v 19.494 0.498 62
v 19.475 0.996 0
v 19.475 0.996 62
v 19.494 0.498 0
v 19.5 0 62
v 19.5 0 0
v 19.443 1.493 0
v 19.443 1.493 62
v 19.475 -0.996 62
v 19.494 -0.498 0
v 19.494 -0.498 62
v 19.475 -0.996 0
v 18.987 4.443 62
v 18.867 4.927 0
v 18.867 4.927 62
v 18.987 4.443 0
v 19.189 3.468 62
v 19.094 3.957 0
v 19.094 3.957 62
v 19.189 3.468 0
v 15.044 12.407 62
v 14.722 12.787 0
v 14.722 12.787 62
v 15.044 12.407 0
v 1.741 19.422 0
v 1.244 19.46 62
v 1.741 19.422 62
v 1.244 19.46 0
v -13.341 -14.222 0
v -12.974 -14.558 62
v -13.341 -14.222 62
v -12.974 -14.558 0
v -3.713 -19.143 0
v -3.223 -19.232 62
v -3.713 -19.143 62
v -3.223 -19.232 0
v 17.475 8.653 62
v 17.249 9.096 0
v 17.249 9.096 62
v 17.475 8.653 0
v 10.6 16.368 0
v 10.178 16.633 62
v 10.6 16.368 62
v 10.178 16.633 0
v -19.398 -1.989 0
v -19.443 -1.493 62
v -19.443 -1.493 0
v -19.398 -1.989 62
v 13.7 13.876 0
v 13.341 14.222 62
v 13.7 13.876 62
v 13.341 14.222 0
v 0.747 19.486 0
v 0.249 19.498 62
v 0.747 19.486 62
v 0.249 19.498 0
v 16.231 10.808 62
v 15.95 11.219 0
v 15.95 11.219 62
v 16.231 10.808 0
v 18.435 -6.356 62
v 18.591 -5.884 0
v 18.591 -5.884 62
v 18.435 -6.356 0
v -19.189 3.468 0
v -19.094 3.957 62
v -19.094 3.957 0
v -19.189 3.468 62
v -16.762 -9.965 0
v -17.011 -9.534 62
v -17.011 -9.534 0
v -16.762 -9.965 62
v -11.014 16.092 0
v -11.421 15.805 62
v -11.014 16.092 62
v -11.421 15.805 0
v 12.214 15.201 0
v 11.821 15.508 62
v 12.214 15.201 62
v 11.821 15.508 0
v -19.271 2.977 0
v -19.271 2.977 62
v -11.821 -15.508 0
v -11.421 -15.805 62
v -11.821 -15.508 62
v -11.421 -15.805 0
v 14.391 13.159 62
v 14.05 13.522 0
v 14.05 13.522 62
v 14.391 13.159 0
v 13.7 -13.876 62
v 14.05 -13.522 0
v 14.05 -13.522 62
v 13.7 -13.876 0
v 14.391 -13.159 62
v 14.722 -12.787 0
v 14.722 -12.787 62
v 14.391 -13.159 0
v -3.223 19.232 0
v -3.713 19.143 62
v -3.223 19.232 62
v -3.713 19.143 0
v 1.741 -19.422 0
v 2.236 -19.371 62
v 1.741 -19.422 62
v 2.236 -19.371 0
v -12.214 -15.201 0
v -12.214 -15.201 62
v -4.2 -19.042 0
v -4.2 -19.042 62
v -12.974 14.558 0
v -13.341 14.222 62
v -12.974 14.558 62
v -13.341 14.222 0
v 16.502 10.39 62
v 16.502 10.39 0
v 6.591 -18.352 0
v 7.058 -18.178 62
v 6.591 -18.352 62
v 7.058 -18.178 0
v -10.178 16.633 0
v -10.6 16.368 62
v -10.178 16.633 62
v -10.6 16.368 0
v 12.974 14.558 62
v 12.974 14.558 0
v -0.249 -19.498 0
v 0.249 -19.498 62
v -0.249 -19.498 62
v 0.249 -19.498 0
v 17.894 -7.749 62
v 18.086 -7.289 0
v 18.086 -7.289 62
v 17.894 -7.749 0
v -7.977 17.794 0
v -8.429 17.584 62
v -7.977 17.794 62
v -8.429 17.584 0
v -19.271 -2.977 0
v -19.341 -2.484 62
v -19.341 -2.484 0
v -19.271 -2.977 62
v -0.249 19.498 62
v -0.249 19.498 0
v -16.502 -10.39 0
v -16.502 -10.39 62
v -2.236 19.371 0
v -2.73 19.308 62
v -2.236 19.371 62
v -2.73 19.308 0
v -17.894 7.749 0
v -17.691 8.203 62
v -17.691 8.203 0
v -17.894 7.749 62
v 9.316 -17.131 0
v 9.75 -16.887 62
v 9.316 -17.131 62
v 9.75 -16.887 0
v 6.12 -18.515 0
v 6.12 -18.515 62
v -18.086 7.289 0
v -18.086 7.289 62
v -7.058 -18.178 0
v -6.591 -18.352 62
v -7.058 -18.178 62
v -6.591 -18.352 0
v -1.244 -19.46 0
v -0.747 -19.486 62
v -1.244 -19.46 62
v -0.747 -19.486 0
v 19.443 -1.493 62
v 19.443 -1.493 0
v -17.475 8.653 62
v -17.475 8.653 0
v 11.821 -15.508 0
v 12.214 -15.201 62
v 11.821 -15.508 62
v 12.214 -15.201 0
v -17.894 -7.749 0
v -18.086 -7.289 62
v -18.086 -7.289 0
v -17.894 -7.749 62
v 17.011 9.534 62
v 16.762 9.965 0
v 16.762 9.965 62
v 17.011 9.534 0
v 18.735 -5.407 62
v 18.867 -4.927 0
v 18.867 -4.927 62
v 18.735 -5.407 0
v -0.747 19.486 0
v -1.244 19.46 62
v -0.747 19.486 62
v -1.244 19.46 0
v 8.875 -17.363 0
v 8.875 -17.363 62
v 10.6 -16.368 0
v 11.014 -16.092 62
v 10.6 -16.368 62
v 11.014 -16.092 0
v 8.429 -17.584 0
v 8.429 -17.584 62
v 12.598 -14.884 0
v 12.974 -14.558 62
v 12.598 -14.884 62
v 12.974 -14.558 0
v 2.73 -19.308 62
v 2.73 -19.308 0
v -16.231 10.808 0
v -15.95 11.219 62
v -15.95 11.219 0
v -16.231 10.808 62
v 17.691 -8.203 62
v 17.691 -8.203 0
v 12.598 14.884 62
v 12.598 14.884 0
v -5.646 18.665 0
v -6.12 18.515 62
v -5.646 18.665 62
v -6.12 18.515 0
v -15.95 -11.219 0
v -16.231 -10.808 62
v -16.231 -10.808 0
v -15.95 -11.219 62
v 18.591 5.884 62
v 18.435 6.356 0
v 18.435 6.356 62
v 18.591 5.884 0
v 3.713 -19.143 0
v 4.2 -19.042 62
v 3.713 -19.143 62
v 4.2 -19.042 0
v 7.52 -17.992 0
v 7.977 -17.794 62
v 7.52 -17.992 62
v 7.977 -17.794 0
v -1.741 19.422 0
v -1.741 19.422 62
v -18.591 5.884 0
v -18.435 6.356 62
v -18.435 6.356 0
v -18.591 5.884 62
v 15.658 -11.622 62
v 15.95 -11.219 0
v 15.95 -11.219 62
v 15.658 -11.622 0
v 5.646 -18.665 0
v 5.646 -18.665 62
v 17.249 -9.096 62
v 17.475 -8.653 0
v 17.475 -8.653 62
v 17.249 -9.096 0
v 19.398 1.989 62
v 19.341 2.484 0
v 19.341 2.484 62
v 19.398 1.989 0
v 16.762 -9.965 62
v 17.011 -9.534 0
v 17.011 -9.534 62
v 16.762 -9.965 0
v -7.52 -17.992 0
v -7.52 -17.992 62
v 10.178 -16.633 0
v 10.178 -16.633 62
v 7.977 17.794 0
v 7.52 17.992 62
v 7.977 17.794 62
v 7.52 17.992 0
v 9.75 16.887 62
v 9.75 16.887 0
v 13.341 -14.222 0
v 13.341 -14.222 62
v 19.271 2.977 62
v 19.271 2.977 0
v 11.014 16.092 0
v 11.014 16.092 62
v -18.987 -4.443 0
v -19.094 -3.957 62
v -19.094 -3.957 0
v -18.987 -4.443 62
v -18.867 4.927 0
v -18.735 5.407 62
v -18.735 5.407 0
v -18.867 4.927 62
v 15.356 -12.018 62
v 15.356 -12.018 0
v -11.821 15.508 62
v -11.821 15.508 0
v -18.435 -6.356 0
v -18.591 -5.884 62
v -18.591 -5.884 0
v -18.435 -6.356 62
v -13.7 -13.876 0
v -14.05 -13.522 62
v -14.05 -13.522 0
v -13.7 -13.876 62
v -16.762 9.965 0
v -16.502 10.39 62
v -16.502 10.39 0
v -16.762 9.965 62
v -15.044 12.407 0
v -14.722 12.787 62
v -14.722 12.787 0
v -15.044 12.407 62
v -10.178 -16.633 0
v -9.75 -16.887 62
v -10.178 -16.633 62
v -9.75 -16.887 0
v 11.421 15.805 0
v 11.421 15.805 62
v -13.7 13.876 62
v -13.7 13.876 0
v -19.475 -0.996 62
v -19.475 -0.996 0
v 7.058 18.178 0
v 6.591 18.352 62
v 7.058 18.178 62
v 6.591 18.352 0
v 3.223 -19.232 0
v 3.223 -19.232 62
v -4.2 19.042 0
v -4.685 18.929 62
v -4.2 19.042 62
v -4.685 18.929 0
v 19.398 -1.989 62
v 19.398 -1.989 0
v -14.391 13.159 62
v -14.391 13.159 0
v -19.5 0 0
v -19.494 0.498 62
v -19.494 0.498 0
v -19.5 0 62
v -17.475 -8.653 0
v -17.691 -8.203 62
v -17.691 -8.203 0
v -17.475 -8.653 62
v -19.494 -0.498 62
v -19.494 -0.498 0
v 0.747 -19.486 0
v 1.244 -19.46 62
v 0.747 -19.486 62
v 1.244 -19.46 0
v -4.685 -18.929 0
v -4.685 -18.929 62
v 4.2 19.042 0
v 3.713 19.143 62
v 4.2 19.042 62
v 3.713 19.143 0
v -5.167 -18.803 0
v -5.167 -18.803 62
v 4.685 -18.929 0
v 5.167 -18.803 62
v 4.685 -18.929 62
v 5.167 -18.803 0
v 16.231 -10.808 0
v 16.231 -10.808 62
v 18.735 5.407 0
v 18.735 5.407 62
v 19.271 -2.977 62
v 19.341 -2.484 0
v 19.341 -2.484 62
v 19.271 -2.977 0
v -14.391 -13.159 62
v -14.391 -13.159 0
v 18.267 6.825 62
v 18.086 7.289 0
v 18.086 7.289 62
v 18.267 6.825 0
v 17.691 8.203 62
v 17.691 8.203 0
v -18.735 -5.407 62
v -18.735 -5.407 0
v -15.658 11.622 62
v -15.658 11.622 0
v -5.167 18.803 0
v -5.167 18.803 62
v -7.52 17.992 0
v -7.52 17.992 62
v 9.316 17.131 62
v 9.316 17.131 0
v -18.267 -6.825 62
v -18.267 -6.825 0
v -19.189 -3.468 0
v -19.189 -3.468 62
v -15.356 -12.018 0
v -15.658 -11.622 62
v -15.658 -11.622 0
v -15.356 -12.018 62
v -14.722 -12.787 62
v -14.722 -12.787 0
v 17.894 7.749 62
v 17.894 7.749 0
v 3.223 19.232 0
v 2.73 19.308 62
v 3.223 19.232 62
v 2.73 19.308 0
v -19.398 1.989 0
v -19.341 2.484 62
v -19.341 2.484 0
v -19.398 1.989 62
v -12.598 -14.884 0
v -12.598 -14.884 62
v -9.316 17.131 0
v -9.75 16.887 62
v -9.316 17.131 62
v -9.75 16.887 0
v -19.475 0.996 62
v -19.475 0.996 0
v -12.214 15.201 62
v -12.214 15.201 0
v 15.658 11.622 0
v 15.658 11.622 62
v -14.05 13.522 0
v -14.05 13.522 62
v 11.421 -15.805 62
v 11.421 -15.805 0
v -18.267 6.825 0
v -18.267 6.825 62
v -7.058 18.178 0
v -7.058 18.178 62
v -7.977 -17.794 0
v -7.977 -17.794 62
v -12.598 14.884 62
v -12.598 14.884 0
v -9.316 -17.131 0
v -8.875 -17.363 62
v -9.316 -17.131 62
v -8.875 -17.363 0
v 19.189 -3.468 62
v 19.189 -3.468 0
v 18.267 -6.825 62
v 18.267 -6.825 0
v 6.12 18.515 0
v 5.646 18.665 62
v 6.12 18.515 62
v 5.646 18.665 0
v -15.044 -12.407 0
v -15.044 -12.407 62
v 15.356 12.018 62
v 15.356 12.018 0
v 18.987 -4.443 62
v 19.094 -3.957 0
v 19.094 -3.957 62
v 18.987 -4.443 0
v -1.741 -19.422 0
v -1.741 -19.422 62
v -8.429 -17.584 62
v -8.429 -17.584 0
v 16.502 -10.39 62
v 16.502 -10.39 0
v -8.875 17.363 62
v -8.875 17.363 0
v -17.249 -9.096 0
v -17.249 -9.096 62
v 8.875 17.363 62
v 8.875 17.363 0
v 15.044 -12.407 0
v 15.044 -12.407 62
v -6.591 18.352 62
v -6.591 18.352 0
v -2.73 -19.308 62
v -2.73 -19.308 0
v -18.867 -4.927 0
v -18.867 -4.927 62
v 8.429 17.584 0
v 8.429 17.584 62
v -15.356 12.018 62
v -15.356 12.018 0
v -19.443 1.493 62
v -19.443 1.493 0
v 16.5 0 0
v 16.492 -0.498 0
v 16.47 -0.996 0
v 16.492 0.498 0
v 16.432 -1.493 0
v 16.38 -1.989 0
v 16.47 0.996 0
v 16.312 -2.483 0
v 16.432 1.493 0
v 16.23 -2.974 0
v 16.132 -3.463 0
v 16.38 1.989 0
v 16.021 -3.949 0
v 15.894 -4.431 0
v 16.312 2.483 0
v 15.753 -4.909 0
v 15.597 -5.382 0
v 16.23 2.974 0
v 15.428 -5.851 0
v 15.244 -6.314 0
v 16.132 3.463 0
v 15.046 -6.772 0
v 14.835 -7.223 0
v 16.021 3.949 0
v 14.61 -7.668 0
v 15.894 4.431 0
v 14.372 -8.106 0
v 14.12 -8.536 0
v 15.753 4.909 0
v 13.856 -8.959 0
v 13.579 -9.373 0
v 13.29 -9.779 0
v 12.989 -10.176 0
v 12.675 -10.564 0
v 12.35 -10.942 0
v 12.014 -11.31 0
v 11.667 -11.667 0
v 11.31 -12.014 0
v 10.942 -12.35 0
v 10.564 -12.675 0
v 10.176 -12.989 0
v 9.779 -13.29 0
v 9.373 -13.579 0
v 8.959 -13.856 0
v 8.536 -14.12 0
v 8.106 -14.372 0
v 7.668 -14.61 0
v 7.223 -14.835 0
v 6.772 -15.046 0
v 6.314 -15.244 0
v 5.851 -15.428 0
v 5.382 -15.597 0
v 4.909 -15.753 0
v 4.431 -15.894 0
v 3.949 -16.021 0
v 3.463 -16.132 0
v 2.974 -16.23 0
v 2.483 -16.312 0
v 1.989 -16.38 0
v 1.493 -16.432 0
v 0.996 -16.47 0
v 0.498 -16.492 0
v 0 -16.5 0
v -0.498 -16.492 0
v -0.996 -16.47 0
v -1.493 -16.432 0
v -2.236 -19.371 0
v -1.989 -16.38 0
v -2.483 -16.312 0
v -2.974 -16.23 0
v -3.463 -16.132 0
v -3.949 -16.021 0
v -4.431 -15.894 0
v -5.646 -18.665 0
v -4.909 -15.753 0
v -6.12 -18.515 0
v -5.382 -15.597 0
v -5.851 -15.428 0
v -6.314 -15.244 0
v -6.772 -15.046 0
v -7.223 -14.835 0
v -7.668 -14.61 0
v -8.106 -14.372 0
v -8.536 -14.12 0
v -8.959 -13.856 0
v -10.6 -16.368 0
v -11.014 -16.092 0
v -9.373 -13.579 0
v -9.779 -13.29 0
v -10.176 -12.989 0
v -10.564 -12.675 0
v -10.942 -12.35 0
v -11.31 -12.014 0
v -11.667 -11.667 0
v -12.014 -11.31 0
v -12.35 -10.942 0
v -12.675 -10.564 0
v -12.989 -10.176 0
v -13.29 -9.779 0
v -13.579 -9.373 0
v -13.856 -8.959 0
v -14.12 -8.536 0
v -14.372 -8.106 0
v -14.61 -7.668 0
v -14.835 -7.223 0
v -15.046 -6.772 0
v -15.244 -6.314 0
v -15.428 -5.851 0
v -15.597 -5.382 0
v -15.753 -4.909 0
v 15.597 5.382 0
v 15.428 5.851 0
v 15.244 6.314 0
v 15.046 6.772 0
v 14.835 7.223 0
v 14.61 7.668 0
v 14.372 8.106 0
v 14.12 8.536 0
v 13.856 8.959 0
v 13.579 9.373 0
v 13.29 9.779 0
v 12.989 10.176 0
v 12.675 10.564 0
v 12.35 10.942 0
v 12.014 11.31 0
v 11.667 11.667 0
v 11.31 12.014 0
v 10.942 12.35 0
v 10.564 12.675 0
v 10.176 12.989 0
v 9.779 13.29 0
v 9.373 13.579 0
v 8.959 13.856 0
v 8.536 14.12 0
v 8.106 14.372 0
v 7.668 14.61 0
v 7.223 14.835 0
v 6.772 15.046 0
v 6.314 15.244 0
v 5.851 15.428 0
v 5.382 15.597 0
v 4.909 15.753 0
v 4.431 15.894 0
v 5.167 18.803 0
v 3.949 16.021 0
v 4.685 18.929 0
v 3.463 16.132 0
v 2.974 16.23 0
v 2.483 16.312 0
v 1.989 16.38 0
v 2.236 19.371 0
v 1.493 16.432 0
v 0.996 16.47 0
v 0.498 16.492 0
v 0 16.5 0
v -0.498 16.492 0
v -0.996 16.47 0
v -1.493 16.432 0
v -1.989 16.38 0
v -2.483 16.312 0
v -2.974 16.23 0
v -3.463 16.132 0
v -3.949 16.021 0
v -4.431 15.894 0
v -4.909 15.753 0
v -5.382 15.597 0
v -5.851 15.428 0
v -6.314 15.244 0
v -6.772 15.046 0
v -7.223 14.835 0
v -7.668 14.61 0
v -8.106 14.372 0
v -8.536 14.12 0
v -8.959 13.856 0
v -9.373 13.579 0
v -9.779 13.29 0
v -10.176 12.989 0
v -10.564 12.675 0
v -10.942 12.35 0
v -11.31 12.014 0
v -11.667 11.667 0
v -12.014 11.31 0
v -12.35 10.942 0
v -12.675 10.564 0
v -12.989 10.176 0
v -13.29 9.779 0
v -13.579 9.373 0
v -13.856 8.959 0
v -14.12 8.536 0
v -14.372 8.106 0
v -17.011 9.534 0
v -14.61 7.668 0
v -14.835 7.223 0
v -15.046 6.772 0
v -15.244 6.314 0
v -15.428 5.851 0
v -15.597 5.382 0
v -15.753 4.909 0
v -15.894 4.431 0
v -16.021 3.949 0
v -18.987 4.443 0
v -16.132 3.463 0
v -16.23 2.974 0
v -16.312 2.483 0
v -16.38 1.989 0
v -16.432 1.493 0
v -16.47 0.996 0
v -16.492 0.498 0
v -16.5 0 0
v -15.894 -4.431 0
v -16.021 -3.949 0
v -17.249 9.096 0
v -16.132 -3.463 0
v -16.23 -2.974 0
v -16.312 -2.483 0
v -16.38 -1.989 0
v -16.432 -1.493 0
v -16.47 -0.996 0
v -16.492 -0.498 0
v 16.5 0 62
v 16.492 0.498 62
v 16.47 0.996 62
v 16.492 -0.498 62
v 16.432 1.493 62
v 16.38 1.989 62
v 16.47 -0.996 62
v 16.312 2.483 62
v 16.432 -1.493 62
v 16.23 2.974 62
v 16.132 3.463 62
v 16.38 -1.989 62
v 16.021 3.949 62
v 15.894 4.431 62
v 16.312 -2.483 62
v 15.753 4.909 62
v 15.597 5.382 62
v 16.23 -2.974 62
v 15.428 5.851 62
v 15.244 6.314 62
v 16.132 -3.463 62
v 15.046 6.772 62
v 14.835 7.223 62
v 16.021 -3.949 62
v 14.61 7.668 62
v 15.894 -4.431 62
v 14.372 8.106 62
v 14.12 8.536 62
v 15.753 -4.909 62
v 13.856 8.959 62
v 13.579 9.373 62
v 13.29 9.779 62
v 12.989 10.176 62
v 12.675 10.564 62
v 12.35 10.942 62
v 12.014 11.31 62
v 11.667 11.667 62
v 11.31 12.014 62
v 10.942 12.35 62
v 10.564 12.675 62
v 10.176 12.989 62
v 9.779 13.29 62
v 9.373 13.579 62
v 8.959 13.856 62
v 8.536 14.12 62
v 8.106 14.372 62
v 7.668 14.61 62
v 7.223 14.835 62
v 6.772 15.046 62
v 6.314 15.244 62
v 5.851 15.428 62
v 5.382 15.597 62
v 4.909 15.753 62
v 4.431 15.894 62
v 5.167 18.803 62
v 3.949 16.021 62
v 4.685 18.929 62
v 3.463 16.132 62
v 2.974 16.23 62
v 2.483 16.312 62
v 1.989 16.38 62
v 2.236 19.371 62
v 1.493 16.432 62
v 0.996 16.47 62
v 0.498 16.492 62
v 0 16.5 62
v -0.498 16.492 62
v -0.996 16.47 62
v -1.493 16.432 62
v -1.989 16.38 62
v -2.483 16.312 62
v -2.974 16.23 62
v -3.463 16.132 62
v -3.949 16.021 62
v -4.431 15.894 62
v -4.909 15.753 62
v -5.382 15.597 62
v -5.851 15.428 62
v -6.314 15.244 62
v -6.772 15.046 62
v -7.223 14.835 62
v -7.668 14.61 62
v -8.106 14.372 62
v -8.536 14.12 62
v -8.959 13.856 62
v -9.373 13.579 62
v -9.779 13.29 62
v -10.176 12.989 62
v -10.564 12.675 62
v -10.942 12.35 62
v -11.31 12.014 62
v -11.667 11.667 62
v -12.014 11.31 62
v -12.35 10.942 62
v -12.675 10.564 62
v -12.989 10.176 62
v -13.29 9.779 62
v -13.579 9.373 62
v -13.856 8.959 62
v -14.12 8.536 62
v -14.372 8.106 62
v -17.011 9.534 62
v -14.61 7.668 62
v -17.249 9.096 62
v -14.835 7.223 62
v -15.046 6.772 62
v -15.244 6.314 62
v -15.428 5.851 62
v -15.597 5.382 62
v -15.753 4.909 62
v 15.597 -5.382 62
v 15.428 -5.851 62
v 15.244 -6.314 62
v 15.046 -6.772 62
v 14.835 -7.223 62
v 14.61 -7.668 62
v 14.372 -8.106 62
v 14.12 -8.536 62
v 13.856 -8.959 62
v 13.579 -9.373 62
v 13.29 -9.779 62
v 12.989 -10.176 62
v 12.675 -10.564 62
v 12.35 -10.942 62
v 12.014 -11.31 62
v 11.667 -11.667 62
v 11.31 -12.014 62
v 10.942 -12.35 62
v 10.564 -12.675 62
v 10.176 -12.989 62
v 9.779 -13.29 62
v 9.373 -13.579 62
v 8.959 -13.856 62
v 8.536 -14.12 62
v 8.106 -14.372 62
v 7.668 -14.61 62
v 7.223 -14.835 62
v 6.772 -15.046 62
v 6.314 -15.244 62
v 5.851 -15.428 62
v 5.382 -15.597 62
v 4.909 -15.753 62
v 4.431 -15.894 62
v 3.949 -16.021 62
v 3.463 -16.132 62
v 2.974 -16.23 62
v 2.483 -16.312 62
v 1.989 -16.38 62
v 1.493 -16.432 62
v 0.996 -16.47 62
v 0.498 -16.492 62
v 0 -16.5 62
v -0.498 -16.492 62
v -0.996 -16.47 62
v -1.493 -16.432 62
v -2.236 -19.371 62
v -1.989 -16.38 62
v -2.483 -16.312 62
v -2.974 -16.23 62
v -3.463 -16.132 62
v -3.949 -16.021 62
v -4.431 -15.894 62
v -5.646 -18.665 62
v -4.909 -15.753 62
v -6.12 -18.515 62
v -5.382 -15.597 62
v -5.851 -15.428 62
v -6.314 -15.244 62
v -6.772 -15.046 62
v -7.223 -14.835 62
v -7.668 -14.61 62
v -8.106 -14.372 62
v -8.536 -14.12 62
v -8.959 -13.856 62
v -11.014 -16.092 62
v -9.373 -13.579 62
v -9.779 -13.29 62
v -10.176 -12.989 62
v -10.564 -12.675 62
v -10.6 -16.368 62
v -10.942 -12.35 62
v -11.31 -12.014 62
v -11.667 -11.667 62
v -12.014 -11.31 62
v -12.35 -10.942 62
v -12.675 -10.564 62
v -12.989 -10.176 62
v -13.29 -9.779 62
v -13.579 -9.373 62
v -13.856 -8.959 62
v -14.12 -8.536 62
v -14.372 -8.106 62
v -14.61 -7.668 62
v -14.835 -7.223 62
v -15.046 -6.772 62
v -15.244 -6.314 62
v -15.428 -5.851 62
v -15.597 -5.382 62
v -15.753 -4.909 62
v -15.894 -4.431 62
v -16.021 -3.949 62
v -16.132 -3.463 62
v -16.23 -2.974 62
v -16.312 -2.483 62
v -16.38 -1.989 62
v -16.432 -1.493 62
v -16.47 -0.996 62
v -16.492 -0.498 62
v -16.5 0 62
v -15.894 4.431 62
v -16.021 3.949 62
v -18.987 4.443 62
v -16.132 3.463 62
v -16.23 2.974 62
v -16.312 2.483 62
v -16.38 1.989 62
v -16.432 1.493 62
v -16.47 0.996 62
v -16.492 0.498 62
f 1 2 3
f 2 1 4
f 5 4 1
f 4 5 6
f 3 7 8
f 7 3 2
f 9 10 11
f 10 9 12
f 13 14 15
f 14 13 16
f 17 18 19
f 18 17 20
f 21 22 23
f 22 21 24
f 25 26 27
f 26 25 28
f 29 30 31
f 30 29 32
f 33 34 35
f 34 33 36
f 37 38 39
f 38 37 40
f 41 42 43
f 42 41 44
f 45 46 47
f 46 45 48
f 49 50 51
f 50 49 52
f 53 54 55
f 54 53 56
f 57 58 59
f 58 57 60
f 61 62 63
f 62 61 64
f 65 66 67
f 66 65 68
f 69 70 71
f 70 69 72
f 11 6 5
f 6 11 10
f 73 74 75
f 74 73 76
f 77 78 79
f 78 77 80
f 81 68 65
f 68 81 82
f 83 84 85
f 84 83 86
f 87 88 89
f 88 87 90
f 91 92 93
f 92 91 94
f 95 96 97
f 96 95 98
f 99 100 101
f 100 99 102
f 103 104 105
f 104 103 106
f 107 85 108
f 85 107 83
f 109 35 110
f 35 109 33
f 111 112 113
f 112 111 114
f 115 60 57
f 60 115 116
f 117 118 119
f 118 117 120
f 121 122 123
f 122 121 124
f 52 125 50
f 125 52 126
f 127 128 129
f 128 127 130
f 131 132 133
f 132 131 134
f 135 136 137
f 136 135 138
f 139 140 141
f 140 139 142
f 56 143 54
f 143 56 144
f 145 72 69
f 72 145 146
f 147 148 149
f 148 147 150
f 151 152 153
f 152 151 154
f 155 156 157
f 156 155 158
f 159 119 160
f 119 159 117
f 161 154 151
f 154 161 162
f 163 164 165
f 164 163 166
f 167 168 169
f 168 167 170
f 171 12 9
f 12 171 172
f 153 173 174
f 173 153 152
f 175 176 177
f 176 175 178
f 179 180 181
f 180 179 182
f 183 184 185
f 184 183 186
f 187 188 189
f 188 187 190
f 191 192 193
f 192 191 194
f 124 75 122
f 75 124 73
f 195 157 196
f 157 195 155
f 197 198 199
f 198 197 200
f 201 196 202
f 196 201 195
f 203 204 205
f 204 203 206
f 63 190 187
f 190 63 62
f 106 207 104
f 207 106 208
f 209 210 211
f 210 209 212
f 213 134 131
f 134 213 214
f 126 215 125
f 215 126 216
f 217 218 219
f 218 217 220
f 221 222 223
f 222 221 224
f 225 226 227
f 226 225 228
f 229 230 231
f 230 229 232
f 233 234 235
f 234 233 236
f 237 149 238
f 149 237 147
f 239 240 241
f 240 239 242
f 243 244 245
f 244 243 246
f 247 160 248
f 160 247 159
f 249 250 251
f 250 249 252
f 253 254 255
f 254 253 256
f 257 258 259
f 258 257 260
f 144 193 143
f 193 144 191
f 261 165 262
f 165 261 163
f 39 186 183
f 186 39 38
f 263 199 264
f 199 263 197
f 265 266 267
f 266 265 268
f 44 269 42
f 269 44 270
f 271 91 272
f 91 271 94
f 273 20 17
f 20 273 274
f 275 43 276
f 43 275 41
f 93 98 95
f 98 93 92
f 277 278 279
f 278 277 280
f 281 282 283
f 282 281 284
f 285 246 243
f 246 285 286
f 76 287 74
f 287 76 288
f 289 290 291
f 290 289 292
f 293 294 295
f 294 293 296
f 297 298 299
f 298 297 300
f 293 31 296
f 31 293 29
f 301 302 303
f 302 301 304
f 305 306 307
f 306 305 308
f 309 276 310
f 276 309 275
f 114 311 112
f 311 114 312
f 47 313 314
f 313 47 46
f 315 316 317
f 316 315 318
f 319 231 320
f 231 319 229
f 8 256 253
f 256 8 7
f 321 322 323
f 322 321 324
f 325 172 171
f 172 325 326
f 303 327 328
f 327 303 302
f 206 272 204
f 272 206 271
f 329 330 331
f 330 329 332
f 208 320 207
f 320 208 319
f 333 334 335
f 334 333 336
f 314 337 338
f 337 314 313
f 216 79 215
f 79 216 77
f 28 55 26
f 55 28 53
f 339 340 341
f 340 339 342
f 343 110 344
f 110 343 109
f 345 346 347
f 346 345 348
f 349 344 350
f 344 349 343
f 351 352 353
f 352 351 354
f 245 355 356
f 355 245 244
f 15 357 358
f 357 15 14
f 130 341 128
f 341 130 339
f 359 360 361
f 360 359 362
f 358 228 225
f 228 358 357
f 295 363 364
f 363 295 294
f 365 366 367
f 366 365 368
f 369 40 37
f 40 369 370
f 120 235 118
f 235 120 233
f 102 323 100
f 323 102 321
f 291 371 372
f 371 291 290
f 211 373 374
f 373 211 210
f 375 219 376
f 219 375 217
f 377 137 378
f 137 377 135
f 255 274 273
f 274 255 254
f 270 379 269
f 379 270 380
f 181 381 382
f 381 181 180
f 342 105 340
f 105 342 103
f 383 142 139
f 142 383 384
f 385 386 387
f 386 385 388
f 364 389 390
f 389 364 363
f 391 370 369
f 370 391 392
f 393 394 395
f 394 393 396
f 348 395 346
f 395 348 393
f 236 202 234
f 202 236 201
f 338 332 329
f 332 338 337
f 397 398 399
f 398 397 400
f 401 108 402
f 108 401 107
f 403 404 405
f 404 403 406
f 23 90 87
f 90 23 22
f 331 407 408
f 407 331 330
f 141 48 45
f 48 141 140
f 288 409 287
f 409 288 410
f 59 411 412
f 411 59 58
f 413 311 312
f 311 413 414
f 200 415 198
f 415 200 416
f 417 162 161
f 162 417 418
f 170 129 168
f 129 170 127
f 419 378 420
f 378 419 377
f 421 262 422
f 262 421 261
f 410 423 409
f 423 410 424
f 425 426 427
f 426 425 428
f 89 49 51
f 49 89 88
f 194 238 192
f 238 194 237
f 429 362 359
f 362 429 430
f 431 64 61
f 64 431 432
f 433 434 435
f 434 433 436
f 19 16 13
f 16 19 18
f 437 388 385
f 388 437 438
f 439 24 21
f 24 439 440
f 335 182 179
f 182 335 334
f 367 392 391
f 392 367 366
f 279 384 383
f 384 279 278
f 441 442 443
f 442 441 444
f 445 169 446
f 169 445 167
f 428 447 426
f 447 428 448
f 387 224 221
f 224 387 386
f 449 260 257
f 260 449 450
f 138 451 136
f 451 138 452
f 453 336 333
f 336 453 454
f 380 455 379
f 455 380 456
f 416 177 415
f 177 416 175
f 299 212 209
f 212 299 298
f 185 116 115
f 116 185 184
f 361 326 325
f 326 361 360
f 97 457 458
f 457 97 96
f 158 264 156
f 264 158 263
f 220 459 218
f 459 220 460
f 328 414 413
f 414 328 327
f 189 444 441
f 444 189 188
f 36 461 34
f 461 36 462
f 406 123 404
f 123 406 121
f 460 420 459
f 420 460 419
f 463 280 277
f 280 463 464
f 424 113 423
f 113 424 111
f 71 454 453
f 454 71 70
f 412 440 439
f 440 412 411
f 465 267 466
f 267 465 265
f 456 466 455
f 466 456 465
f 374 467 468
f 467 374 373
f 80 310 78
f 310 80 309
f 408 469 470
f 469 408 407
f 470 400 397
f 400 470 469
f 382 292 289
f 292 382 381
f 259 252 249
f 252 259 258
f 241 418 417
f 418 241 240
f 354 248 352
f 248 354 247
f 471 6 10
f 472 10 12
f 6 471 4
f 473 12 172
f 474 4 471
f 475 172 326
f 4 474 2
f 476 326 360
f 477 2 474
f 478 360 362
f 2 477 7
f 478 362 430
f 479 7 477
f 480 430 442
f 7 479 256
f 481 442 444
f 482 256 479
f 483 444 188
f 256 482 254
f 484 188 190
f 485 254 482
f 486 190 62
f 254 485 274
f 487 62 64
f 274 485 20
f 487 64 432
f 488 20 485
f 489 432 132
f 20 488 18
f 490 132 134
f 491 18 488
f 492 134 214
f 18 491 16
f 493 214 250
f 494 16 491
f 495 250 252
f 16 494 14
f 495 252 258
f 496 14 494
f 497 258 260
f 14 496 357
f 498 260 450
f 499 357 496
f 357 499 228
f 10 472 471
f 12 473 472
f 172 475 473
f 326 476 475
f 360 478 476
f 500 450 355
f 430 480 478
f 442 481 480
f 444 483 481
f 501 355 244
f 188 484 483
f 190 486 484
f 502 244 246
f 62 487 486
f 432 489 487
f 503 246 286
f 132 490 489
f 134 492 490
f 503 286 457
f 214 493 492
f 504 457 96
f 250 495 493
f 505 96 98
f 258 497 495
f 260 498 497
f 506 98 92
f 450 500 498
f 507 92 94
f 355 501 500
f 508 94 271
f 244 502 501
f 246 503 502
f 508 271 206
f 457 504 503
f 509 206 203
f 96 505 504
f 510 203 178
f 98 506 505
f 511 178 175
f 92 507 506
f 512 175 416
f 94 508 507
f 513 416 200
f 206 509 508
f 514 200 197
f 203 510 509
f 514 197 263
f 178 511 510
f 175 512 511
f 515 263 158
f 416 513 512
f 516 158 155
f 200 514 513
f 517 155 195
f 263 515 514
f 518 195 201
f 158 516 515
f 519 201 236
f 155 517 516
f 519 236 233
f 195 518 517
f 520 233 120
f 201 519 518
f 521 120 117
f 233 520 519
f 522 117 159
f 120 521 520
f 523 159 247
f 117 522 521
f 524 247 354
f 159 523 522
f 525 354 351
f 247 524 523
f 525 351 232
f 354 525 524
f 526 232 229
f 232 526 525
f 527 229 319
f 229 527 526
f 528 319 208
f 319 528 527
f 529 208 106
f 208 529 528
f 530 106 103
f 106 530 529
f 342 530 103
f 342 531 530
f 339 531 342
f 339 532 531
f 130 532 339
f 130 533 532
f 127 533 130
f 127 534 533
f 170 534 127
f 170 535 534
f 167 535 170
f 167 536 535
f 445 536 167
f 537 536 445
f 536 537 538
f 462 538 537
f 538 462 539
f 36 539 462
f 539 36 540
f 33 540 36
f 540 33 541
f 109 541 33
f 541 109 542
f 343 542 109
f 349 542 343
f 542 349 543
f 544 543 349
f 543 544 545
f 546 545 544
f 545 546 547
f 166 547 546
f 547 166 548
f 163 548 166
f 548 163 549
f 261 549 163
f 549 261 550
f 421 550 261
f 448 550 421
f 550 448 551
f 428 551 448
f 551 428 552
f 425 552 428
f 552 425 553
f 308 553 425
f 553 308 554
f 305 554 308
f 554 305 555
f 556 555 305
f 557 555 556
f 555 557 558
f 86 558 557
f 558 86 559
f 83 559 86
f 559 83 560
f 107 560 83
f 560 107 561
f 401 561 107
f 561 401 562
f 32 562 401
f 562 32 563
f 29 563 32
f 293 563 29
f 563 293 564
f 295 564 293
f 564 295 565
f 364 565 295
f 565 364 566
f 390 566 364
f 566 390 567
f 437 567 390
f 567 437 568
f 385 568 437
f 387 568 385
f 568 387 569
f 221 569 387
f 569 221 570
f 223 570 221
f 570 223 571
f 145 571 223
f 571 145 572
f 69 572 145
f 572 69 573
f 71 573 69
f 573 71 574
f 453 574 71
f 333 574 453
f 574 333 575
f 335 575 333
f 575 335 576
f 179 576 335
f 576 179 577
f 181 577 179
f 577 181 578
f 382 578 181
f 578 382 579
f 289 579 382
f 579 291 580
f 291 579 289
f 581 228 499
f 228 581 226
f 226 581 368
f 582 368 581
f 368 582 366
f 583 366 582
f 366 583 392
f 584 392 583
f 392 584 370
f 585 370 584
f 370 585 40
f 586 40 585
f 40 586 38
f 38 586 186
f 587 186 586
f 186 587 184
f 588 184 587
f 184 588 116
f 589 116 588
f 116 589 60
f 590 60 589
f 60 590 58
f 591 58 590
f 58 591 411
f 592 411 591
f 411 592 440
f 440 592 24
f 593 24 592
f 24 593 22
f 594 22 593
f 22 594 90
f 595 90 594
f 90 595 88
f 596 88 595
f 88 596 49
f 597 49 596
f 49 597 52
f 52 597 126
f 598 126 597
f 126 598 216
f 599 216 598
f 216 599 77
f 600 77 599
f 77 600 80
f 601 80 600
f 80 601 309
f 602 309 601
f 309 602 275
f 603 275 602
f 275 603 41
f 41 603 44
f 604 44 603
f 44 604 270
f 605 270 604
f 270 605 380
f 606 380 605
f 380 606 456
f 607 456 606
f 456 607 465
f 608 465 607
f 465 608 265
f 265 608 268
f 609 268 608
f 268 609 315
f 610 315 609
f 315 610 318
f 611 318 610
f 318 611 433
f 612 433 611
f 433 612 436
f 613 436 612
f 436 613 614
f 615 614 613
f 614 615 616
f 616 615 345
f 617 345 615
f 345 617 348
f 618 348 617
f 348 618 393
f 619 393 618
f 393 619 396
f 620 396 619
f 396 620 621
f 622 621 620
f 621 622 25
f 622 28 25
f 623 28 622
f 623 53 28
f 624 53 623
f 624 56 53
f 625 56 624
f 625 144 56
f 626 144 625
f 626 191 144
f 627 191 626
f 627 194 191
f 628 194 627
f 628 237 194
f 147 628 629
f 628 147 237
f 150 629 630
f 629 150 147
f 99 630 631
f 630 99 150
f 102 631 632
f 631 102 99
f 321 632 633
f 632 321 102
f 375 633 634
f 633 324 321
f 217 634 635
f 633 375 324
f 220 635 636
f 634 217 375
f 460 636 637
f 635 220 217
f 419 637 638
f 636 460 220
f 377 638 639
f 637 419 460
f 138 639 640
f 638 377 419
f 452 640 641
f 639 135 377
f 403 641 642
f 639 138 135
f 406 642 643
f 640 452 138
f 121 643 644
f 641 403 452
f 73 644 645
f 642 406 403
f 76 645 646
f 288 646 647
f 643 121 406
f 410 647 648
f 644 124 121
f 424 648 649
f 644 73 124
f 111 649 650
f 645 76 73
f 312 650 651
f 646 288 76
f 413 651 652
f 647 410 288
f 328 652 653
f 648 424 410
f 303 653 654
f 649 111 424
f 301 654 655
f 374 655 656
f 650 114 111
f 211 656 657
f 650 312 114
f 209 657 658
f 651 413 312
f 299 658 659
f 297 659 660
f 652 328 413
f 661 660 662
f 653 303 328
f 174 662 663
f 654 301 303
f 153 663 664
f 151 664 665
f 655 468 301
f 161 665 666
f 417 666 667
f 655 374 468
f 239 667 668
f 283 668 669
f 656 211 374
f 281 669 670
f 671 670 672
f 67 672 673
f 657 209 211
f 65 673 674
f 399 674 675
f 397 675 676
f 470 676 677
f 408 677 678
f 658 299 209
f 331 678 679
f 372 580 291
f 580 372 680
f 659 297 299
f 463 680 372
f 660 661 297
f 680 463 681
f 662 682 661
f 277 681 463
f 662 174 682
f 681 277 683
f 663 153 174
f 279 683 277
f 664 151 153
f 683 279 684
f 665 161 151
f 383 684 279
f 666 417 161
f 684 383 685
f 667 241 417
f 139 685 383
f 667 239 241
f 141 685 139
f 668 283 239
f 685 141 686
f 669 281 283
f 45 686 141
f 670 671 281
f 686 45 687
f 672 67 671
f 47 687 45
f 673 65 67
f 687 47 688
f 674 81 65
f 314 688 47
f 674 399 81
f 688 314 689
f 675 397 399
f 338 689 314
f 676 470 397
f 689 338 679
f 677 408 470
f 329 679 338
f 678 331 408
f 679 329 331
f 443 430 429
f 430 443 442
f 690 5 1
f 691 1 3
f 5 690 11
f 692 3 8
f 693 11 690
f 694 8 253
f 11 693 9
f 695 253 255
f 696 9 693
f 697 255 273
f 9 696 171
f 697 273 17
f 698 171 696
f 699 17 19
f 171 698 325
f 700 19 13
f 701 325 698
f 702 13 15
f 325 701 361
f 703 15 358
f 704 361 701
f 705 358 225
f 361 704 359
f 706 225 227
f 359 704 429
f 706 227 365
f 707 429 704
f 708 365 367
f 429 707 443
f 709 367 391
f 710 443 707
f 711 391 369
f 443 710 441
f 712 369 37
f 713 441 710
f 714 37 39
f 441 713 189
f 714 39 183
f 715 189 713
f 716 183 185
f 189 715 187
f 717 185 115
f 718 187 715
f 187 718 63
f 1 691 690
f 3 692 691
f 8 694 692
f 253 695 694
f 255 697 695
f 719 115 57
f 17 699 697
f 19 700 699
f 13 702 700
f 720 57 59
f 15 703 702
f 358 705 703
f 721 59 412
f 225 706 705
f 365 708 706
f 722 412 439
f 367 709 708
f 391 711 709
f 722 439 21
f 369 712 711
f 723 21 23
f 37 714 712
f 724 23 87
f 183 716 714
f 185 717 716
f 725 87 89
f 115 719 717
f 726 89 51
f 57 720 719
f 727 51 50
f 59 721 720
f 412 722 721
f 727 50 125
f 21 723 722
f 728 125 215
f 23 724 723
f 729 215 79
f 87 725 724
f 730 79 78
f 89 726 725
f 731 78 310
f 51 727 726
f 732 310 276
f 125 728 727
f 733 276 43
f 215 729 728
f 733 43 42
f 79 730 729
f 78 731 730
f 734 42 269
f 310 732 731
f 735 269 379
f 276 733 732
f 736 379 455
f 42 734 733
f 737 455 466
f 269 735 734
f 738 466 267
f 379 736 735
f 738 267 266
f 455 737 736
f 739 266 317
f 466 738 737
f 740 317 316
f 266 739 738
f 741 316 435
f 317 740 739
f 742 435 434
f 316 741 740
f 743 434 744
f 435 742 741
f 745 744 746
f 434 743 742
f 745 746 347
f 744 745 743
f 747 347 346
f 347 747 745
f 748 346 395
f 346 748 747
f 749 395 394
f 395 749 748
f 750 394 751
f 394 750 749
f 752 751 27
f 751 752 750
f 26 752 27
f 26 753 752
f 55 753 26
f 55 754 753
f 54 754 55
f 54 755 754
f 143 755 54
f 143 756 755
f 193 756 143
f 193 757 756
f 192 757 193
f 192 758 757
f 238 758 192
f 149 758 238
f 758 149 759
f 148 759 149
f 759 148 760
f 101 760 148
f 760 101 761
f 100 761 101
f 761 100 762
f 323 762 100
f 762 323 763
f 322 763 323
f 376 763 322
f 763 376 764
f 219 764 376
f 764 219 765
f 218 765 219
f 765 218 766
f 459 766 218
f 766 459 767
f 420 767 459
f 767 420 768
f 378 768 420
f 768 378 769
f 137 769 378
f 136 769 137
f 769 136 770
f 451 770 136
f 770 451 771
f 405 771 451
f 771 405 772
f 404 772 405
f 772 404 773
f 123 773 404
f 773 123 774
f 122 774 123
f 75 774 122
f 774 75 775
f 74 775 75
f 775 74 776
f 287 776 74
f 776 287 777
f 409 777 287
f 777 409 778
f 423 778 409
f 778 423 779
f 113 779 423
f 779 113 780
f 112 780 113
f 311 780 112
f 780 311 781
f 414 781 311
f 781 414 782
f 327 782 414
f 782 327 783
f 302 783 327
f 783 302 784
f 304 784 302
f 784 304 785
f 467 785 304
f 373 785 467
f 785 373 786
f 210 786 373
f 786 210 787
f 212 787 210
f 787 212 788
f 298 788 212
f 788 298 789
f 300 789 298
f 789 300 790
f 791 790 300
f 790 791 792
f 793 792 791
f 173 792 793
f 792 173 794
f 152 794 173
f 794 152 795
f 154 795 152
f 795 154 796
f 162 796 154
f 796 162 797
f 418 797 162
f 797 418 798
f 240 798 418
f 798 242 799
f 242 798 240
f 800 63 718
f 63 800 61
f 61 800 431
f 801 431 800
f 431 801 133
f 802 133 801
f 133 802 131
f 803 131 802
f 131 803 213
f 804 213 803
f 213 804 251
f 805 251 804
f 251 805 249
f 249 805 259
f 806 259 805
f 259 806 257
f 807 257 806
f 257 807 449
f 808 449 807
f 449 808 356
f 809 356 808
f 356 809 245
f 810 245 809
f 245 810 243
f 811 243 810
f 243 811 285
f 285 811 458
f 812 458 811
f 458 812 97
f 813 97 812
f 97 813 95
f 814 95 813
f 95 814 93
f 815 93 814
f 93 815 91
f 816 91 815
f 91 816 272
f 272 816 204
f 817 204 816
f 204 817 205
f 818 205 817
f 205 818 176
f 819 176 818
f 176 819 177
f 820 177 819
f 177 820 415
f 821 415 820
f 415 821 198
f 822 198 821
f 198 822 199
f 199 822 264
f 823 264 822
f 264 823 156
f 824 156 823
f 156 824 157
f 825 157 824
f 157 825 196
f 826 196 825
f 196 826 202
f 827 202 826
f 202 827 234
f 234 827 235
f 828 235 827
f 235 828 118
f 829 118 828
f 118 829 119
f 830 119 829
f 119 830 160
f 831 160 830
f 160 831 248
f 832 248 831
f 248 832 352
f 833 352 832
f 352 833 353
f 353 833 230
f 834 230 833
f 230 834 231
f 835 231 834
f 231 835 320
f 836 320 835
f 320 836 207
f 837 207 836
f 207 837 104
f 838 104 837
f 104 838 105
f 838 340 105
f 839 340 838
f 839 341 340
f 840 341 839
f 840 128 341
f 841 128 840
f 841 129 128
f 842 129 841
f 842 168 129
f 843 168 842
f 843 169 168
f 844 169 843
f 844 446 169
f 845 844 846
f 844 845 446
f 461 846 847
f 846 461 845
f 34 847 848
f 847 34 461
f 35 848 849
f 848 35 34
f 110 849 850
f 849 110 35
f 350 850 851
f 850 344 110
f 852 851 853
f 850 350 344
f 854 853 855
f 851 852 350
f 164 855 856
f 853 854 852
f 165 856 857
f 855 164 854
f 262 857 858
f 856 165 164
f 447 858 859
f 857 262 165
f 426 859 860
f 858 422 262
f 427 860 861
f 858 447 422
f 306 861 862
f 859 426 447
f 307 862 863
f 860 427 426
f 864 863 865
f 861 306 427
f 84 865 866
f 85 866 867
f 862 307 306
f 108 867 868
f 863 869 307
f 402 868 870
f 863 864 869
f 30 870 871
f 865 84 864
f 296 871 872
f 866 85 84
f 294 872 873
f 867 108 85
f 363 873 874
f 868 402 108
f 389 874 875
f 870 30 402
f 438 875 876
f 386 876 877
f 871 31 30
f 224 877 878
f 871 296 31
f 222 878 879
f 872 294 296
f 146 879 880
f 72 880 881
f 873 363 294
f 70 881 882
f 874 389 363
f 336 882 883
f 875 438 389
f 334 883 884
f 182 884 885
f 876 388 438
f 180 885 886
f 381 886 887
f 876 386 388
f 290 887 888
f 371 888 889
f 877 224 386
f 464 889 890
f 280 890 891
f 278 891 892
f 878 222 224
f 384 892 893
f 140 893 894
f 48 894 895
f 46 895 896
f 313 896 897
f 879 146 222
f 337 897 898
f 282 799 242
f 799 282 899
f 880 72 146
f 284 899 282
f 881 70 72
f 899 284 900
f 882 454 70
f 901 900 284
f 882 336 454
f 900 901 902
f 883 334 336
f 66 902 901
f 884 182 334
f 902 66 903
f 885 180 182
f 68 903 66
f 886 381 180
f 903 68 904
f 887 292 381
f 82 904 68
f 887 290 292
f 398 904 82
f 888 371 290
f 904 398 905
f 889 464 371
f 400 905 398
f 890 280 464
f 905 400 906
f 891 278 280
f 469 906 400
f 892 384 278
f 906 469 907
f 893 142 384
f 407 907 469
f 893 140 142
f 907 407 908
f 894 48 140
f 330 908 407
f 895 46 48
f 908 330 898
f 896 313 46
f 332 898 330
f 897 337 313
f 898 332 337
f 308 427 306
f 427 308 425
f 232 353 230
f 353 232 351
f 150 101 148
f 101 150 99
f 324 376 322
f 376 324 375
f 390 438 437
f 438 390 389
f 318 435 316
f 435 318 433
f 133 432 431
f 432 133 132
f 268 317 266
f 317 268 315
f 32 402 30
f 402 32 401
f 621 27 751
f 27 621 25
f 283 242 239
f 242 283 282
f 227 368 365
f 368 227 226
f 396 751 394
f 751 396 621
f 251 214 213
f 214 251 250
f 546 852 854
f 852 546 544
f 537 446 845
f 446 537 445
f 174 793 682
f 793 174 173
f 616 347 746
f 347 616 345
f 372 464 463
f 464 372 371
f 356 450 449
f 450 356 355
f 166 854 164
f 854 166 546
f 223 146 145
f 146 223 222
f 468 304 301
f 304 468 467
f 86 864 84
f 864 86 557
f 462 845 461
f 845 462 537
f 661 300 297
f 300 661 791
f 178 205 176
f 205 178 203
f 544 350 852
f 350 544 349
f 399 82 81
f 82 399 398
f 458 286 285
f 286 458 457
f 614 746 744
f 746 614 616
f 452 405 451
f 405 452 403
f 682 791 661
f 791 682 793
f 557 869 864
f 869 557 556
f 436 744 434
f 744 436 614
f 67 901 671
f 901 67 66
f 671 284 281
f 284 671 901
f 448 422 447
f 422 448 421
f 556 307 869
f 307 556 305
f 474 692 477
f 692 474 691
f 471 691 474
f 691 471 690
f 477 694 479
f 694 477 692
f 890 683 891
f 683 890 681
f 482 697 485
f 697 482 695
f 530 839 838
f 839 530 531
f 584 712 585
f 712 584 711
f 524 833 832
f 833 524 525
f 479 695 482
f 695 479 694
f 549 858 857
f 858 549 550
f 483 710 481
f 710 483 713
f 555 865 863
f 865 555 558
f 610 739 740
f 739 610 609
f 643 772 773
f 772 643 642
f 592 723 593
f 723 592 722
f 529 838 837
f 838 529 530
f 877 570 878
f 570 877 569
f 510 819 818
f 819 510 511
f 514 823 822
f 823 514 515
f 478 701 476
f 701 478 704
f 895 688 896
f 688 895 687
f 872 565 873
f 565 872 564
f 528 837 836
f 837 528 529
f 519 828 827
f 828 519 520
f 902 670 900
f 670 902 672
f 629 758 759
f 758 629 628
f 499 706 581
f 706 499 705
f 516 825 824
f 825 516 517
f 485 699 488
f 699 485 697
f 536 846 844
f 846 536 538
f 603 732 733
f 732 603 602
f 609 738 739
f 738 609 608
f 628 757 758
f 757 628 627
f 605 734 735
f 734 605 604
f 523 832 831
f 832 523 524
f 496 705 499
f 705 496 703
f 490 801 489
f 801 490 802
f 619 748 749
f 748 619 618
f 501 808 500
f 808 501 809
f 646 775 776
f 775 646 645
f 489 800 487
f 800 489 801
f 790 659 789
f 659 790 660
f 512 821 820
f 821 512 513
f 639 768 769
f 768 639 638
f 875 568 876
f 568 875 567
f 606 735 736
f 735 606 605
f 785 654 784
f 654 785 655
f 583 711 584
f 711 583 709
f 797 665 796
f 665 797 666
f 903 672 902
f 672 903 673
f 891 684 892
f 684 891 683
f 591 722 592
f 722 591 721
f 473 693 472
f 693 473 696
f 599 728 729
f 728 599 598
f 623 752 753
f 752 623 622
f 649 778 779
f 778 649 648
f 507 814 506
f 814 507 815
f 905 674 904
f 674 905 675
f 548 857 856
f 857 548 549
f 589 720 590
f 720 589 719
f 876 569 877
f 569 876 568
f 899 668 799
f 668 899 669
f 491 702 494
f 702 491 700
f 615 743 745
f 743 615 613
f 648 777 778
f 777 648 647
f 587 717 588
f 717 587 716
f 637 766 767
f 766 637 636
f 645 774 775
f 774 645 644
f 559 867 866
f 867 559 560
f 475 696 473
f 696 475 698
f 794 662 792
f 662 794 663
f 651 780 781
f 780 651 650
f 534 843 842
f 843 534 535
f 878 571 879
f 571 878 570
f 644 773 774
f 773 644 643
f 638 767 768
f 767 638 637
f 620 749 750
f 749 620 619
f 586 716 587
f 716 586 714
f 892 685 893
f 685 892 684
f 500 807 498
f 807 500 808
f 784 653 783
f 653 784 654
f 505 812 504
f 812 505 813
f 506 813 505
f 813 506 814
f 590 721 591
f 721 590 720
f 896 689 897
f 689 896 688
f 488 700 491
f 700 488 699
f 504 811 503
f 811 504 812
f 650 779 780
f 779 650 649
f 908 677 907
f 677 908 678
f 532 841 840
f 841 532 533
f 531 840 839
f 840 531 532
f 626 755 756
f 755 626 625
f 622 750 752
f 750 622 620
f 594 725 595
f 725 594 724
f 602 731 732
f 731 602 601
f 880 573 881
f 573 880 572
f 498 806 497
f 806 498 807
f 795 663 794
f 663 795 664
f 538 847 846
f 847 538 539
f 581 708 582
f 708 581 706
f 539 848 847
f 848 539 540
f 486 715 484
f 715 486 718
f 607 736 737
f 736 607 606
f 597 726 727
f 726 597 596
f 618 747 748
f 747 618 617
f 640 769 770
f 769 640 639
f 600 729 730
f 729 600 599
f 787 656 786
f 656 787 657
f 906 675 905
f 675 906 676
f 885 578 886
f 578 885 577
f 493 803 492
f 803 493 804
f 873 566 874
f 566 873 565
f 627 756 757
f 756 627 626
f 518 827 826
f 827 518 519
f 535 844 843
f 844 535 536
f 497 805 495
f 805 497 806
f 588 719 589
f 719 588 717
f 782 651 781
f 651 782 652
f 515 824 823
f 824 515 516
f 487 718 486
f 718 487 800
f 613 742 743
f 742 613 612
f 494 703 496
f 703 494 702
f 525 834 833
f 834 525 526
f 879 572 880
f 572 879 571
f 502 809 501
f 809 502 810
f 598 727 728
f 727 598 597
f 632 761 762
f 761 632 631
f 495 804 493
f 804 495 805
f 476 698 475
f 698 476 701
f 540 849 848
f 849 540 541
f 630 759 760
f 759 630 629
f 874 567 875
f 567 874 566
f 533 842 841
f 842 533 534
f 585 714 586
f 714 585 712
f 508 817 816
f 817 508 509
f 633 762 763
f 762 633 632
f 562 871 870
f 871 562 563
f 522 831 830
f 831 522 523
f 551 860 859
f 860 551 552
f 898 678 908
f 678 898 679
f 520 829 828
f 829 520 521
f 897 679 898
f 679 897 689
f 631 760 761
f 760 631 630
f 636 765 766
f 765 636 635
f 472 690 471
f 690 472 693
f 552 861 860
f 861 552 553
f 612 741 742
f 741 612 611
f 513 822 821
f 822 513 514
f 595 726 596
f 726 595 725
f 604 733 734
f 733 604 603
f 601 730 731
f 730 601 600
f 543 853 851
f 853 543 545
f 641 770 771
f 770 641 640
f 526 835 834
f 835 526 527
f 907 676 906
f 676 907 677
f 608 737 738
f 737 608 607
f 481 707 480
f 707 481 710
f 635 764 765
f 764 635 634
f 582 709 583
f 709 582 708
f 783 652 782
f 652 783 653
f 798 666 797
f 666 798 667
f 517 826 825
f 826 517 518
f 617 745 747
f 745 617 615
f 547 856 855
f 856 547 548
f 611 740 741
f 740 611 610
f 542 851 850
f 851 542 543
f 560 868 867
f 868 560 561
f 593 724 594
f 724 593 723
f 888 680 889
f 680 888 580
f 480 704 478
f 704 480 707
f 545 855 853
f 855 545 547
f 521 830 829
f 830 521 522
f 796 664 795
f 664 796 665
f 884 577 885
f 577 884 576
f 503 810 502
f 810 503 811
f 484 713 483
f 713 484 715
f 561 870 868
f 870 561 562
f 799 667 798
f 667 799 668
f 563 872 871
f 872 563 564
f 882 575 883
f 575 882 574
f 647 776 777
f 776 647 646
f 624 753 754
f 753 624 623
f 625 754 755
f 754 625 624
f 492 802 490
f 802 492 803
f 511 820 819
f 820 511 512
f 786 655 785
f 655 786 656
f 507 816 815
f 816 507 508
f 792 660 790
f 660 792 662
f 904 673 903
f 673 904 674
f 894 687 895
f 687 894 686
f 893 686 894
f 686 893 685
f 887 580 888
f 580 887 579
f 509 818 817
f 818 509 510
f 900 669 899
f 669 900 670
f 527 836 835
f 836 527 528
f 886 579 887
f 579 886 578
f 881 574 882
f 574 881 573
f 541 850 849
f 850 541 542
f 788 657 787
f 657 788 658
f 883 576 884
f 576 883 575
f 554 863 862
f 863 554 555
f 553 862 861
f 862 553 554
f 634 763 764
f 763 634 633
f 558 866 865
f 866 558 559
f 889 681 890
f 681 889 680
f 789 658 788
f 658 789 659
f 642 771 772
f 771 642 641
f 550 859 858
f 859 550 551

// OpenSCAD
module tube(length,thickness,radius) {
    difference() {
        cylinder(r=radius, h=length);
        translate([0,0,-1]) cylinder(r=radius-thickness, h=length+2);
    }
}
$fa=1;
$fs=0.5;
tube(62,3,39/2);
